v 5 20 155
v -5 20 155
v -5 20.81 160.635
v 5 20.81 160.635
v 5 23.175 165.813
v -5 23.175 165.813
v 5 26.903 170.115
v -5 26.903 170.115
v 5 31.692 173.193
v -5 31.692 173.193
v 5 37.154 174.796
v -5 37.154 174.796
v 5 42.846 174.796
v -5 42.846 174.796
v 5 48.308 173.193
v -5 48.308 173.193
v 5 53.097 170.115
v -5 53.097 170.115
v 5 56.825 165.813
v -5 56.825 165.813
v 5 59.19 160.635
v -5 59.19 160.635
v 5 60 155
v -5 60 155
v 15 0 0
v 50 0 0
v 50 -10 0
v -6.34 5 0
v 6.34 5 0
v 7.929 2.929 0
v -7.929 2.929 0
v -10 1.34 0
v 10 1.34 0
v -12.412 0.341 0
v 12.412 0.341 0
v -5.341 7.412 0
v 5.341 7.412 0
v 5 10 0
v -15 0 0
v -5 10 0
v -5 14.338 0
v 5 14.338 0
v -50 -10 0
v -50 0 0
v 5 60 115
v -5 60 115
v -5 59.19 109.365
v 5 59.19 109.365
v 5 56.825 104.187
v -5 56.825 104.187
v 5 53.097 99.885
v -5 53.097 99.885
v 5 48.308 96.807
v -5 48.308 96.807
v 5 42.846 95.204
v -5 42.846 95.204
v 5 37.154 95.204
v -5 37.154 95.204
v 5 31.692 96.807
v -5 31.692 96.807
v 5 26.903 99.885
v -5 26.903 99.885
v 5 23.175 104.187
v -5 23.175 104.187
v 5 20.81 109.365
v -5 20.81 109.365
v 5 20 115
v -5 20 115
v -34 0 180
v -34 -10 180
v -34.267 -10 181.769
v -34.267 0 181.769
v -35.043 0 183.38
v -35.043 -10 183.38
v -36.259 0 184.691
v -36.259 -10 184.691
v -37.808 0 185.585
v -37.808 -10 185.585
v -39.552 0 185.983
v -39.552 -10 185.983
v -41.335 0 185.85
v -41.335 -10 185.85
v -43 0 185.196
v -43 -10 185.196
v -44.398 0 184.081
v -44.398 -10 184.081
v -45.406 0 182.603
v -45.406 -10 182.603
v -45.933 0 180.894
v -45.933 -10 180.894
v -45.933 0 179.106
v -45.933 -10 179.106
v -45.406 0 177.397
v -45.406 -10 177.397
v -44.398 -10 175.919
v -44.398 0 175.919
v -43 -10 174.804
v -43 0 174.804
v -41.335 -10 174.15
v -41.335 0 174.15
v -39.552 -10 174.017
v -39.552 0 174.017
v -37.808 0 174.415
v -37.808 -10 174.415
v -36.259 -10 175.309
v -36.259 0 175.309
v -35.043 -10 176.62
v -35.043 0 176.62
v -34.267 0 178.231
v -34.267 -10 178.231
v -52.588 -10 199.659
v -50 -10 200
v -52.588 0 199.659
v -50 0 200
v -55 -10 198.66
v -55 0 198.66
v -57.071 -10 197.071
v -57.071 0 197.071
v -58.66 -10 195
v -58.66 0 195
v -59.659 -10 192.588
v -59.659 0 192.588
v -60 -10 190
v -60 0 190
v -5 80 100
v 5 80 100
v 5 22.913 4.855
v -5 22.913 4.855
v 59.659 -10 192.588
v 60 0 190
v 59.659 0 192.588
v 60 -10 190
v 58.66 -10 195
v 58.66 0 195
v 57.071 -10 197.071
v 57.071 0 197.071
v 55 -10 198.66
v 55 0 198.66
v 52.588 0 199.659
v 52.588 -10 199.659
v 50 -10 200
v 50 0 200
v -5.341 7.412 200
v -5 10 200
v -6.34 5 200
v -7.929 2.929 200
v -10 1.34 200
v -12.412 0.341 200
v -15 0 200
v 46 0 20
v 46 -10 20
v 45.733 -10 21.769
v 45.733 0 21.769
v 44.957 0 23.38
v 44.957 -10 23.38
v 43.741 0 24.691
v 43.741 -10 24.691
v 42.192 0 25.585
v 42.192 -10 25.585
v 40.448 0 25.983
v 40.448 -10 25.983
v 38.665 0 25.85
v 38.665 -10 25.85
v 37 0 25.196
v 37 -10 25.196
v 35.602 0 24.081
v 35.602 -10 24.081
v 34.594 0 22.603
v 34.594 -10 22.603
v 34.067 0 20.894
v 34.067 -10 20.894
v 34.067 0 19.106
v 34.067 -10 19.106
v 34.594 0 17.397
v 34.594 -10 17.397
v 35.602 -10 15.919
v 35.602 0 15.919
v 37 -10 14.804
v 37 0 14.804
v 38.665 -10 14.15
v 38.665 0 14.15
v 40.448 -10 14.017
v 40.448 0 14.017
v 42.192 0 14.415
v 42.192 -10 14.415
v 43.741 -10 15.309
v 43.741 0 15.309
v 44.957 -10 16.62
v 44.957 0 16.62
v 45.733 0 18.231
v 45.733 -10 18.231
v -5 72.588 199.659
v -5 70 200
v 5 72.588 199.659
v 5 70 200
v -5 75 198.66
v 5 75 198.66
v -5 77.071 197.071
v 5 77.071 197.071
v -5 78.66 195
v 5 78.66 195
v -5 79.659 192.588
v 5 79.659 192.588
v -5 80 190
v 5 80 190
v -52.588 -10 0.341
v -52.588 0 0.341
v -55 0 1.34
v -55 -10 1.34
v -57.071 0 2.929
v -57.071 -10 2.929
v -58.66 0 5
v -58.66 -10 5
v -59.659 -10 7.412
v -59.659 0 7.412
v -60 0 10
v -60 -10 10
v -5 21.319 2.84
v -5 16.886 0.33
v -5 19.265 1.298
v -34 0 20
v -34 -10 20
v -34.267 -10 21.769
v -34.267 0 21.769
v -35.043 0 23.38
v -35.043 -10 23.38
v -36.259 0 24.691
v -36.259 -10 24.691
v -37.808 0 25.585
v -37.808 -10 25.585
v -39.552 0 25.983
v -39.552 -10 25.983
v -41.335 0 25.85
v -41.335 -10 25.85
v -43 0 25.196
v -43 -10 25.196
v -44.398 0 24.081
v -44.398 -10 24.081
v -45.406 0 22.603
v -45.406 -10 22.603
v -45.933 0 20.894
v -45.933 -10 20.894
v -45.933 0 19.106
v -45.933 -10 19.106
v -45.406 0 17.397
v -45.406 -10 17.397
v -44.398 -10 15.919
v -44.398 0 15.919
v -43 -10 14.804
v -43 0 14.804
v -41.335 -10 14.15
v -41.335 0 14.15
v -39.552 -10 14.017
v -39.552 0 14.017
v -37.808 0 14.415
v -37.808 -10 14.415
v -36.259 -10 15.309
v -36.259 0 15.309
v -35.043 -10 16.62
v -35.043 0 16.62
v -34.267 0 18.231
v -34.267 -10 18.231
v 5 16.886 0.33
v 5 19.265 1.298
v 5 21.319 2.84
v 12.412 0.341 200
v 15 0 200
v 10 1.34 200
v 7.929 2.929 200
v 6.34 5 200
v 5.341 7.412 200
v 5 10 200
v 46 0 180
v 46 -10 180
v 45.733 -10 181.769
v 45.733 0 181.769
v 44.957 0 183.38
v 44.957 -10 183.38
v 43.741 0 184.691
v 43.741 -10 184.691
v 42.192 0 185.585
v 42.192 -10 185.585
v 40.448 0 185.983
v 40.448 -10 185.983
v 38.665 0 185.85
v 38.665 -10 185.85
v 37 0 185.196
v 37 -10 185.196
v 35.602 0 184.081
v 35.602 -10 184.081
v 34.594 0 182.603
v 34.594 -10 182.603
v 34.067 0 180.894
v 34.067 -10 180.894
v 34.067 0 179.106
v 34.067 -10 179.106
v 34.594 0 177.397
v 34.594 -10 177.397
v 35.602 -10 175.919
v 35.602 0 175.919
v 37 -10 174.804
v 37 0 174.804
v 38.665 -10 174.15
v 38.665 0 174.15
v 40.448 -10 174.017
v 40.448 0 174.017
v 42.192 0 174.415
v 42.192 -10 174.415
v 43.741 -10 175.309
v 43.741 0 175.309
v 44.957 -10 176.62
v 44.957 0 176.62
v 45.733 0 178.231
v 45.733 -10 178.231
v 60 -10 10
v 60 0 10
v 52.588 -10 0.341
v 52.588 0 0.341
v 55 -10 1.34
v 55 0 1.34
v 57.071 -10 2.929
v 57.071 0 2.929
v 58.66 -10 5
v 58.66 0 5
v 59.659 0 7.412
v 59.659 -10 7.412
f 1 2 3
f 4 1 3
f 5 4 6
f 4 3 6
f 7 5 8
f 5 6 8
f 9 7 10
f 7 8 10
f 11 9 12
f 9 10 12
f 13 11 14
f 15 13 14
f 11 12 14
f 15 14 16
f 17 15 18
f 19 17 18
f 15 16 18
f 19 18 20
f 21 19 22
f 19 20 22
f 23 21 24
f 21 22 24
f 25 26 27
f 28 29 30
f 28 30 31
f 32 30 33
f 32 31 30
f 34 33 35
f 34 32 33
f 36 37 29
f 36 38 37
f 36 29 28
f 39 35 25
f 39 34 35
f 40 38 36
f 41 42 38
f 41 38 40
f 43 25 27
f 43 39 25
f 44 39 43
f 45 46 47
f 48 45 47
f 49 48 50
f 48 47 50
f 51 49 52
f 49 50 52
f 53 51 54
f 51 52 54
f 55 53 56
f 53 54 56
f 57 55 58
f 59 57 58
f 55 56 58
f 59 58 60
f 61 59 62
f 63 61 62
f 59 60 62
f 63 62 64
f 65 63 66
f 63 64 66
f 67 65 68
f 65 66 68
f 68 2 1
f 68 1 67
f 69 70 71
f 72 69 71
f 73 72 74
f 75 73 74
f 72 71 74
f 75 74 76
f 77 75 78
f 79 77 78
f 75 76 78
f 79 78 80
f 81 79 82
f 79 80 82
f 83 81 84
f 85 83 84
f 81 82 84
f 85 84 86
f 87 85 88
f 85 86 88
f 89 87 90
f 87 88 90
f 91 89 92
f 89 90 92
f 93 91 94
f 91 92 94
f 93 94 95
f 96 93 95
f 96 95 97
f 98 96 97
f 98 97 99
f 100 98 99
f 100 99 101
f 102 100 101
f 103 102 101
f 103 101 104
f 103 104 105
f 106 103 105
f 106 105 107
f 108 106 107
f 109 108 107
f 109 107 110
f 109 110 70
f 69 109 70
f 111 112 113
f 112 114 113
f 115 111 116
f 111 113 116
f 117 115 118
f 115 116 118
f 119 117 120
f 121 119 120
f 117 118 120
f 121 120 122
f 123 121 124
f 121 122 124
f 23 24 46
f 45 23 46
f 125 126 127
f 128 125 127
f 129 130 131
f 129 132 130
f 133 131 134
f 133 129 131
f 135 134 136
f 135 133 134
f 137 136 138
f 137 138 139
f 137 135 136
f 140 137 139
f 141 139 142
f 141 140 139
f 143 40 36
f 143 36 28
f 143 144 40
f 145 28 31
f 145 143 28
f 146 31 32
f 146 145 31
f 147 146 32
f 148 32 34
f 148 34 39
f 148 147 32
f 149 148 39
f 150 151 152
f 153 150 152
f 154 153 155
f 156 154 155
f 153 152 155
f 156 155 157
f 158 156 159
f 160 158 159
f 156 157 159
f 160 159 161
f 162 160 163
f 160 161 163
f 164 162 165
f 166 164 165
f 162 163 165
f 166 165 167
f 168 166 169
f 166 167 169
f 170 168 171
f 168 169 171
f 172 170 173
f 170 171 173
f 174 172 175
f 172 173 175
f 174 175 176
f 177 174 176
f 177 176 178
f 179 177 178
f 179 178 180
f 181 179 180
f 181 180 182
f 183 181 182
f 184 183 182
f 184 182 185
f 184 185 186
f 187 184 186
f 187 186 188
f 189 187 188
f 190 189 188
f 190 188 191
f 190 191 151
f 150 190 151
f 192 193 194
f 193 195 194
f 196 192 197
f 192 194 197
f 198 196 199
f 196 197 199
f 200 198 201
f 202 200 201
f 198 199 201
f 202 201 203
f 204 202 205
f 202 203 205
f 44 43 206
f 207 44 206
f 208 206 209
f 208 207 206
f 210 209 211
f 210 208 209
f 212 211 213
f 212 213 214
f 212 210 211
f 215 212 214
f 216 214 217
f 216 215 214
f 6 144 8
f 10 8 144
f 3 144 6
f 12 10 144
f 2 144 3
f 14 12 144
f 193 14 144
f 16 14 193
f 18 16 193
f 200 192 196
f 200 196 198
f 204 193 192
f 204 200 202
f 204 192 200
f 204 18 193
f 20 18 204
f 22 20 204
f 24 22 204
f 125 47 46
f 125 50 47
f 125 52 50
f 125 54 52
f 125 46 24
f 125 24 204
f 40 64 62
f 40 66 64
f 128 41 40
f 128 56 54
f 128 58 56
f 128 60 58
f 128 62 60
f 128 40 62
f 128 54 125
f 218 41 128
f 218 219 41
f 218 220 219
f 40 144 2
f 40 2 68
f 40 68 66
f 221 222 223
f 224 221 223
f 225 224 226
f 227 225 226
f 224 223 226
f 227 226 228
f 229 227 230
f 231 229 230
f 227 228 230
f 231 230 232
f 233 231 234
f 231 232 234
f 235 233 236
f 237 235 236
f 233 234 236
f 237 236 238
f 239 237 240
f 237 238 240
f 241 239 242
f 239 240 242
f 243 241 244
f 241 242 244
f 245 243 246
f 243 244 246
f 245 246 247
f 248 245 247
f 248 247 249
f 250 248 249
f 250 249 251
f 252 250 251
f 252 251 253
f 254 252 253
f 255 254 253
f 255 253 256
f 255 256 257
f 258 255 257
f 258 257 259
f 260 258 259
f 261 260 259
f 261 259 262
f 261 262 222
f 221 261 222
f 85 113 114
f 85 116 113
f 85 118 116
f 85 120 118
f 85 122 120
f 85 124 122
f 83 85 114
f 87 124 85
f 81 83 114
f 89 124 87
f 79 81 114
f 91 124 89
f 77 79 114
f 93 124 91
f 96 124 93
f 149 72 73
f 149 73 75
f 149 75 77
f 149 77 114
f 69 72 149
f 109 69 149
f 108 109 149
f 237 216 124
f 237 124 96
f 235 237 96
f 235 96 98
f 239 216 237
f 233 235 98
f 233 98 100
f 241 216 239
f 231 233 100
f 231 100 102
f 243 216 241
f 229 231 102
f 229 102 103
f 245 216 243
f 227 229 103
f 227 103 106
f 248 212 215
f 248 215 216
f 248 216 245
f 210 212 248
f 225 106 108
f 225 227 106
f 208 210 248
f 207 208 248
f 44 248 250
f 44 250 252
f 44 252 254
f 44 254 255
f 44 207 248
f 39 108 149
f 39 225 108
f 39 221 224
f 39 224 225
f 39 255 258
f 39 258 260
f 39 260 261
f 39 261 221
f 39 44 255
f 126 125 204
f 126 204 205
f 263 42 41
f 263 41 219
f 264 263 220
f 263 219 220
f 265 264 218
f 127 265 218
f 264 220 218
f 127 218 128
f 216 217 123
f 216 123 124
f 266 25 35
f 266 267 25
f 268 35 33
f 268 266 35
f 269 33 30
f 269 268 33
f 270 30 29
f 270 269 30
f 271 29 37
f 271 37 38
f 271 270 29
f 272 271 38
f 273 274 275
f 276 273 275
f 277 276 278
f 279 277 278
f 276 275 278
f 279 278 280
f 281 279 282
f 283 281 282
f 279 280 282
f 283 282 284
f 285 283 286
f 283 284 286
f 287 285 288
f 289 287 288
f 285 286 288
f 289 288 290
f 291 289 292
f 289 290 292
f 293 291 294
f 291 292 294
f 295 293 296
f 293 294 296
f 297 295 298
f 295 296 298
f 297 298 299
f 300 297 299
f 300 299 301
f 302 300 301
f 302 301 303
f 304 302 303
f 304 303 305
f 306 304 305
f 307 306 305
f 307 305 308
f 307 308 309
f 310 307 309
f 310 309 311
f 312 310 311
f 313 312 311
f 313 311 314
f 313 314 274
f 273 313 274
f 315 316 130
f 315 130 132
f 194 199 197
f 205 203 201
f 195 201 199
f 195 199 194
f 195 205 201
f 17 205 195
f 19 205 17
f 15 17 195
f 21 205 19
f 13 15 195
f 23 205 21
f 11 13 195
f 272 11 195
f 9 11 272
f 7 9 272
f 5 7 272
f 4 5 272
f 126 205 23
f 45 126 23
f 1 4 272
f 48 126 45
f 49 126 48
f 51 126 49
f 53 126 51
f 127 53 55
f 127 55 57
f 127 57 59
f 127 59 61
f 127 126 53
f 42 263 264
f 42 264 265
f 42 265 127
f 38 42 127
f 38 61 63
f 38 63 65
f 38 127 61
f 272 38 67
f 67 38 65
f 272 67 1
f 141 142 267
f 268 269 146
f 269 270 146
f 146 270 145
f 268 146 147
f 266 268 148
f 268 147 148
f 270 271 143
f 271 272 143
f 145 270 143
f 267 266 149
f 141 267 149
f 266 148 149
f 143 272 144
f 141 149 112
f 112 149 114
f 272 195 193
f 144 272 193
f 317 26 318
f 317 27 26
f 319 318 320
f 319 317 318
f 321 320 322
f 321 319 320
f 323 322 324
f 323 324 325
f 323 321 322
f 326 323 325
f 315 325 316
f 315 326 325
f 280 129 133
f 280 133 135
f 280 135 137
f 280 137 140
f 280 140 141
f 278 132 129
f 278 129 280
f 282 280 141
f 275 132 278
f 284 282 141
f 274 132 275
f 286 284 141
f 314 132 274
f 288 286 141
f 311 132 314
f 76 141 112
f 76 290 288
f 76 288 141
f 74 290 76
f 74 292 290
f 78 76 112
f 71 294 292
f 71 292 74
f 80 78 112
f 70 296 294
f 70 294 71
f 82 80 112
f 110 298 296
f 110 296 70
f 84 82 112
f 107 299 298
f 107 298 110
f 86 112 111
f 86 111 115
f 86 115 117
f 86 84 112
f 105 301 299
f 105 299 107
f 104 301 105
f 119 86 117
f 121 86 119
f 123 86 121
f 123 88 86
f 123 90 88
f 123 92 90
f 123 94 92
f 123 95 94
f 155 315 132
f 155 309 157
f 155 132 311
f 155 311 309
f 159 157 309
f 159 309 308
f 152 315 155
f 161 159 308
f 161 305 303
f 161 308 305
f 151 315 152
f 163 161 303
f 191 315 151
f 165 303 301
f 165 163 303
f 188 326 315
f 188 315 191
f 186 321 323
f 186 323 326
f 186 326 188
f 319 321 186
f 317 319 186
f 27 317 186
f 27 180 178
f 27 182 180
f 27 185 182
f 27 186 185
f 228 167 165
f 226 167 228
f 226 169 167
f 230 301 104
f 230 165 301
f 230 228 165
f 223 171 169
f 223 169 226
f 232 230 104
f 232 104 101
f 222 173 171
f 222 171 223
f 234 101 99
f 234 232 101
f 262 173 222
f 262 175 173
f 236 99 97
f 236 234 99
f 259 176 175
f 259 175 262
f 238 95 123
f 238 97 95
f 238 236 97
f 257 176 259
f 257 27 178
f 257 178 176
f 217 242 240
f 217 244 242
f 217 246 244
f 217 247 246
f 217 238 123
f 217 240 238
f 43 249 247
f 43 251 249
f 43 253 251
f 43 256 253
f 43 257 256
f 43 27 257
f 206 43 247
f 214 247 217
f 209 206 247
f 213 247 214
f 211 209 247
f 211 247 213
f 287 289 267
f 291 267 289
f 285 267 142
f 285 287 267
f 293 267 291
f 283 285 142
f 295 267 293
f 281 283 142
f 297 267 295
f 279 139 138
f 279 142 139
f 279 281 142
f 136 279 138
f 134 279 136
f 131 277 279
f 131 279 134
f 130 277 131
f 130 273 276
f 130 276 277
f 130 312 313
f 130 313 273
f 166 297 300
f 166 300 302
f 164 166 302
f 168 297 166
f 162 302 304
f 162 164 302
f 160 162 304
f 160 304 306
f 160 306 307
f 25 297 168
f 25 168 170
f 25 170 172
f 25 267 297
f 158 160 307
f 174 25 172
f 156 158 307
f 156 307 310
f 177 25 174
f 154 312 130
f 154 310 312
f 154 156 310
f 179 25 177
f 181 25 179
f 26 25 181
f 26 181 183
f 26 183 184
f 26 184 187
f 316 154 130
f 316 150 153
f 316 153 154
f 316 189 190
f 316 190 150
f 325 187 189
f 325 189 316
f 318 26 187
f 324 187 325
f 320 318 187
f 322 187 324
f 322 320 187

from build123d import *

# Parameters (mm, degrees)
PAD_DEPTH       = 200
POCKET_DEPTH    = 65.001
POCKET001_DEPTH = 65.001
SKETCH003_R     = 6
POCKET002_DEPTH = 90.001
FILLET_R        = 10
FILLET001_R     = 10


with BuildPart() as part:
    # Sketch → Pad (new body)
    with BuildSketch(Plane.XY):
        Polygon((60, 0), (60, -10), (-60, -10), (-60, 0), (-5, 0), (-5, 80), (5, 80), (5, 0), align=None)
    extrude(amount=PAD_DEPTH)

    # Sketch001 → Pocket (cut, through all)
    with BuildSketch(Plane.YZ.offset(5)):
        Polygon((20, 0), (80, 0), (80, 100), align=None)
    extrude(amount=-POCKET_DEPTH, mode=Mode.SUBTRACT)

    # Sketch002 → Pocket001 (cut, through all)
    with BuildSketch(Plane(origin=(-5, 0, 0), x_dir=(0, -1, 0), z_dir=(-1, 0, 0))):
        with BuildLine():
            ThreePointArc((-20, 155), (-40, 175), (-60, 155))
            Line((-60, 155), (-60, 115))
            ThreePointArc((-60, 115), (-40, 95), (-20, 115))
            Line((-20, 155), (-20, 115))
        make_face()
    extrude(amount=-POCKET001_DEPTH, mode=Mode.SUBTRACT)

    # Sketch003 → Pocket002 (cut, through all)
    with BuildSketch(Plane.XZ.offset(10)):
        with Locations((-40, 180)):
            Circle(SKETCH003_R)
        with Locations((40, 180)):
            Circle(SKETCH003_R)
        with Locations((-40, 20)):
            Circle(SKETCH003_R)
        with Locations((40, 20)):
            Circle(SKETCH003_R)
    extrude(amount=-POCKET002_DEPTH, mode=Mode.SUBTRACT)

    # Fillet
    fillet_edges = [part.edges().sort_by_distance(p)[0] for p in [
        (5, 0, 100),
        (-5, 0, 100),
    ]]
    fillet(fillet_edges, radius=FILLET_R)

    # Fillet001
    fillet001_edges = [part.edges().sort_by_distance(p)[0] for p in [
        (-60, -5, 200),
        (60, -5, 200),
        (60, -5, 0),
        (-60, -5, 0),
        (0, 20, 0),
        (0, 80, 200),
    ]]
    fillet(fillet001_edges, radius=FILLET001_R)


solid = part.part
